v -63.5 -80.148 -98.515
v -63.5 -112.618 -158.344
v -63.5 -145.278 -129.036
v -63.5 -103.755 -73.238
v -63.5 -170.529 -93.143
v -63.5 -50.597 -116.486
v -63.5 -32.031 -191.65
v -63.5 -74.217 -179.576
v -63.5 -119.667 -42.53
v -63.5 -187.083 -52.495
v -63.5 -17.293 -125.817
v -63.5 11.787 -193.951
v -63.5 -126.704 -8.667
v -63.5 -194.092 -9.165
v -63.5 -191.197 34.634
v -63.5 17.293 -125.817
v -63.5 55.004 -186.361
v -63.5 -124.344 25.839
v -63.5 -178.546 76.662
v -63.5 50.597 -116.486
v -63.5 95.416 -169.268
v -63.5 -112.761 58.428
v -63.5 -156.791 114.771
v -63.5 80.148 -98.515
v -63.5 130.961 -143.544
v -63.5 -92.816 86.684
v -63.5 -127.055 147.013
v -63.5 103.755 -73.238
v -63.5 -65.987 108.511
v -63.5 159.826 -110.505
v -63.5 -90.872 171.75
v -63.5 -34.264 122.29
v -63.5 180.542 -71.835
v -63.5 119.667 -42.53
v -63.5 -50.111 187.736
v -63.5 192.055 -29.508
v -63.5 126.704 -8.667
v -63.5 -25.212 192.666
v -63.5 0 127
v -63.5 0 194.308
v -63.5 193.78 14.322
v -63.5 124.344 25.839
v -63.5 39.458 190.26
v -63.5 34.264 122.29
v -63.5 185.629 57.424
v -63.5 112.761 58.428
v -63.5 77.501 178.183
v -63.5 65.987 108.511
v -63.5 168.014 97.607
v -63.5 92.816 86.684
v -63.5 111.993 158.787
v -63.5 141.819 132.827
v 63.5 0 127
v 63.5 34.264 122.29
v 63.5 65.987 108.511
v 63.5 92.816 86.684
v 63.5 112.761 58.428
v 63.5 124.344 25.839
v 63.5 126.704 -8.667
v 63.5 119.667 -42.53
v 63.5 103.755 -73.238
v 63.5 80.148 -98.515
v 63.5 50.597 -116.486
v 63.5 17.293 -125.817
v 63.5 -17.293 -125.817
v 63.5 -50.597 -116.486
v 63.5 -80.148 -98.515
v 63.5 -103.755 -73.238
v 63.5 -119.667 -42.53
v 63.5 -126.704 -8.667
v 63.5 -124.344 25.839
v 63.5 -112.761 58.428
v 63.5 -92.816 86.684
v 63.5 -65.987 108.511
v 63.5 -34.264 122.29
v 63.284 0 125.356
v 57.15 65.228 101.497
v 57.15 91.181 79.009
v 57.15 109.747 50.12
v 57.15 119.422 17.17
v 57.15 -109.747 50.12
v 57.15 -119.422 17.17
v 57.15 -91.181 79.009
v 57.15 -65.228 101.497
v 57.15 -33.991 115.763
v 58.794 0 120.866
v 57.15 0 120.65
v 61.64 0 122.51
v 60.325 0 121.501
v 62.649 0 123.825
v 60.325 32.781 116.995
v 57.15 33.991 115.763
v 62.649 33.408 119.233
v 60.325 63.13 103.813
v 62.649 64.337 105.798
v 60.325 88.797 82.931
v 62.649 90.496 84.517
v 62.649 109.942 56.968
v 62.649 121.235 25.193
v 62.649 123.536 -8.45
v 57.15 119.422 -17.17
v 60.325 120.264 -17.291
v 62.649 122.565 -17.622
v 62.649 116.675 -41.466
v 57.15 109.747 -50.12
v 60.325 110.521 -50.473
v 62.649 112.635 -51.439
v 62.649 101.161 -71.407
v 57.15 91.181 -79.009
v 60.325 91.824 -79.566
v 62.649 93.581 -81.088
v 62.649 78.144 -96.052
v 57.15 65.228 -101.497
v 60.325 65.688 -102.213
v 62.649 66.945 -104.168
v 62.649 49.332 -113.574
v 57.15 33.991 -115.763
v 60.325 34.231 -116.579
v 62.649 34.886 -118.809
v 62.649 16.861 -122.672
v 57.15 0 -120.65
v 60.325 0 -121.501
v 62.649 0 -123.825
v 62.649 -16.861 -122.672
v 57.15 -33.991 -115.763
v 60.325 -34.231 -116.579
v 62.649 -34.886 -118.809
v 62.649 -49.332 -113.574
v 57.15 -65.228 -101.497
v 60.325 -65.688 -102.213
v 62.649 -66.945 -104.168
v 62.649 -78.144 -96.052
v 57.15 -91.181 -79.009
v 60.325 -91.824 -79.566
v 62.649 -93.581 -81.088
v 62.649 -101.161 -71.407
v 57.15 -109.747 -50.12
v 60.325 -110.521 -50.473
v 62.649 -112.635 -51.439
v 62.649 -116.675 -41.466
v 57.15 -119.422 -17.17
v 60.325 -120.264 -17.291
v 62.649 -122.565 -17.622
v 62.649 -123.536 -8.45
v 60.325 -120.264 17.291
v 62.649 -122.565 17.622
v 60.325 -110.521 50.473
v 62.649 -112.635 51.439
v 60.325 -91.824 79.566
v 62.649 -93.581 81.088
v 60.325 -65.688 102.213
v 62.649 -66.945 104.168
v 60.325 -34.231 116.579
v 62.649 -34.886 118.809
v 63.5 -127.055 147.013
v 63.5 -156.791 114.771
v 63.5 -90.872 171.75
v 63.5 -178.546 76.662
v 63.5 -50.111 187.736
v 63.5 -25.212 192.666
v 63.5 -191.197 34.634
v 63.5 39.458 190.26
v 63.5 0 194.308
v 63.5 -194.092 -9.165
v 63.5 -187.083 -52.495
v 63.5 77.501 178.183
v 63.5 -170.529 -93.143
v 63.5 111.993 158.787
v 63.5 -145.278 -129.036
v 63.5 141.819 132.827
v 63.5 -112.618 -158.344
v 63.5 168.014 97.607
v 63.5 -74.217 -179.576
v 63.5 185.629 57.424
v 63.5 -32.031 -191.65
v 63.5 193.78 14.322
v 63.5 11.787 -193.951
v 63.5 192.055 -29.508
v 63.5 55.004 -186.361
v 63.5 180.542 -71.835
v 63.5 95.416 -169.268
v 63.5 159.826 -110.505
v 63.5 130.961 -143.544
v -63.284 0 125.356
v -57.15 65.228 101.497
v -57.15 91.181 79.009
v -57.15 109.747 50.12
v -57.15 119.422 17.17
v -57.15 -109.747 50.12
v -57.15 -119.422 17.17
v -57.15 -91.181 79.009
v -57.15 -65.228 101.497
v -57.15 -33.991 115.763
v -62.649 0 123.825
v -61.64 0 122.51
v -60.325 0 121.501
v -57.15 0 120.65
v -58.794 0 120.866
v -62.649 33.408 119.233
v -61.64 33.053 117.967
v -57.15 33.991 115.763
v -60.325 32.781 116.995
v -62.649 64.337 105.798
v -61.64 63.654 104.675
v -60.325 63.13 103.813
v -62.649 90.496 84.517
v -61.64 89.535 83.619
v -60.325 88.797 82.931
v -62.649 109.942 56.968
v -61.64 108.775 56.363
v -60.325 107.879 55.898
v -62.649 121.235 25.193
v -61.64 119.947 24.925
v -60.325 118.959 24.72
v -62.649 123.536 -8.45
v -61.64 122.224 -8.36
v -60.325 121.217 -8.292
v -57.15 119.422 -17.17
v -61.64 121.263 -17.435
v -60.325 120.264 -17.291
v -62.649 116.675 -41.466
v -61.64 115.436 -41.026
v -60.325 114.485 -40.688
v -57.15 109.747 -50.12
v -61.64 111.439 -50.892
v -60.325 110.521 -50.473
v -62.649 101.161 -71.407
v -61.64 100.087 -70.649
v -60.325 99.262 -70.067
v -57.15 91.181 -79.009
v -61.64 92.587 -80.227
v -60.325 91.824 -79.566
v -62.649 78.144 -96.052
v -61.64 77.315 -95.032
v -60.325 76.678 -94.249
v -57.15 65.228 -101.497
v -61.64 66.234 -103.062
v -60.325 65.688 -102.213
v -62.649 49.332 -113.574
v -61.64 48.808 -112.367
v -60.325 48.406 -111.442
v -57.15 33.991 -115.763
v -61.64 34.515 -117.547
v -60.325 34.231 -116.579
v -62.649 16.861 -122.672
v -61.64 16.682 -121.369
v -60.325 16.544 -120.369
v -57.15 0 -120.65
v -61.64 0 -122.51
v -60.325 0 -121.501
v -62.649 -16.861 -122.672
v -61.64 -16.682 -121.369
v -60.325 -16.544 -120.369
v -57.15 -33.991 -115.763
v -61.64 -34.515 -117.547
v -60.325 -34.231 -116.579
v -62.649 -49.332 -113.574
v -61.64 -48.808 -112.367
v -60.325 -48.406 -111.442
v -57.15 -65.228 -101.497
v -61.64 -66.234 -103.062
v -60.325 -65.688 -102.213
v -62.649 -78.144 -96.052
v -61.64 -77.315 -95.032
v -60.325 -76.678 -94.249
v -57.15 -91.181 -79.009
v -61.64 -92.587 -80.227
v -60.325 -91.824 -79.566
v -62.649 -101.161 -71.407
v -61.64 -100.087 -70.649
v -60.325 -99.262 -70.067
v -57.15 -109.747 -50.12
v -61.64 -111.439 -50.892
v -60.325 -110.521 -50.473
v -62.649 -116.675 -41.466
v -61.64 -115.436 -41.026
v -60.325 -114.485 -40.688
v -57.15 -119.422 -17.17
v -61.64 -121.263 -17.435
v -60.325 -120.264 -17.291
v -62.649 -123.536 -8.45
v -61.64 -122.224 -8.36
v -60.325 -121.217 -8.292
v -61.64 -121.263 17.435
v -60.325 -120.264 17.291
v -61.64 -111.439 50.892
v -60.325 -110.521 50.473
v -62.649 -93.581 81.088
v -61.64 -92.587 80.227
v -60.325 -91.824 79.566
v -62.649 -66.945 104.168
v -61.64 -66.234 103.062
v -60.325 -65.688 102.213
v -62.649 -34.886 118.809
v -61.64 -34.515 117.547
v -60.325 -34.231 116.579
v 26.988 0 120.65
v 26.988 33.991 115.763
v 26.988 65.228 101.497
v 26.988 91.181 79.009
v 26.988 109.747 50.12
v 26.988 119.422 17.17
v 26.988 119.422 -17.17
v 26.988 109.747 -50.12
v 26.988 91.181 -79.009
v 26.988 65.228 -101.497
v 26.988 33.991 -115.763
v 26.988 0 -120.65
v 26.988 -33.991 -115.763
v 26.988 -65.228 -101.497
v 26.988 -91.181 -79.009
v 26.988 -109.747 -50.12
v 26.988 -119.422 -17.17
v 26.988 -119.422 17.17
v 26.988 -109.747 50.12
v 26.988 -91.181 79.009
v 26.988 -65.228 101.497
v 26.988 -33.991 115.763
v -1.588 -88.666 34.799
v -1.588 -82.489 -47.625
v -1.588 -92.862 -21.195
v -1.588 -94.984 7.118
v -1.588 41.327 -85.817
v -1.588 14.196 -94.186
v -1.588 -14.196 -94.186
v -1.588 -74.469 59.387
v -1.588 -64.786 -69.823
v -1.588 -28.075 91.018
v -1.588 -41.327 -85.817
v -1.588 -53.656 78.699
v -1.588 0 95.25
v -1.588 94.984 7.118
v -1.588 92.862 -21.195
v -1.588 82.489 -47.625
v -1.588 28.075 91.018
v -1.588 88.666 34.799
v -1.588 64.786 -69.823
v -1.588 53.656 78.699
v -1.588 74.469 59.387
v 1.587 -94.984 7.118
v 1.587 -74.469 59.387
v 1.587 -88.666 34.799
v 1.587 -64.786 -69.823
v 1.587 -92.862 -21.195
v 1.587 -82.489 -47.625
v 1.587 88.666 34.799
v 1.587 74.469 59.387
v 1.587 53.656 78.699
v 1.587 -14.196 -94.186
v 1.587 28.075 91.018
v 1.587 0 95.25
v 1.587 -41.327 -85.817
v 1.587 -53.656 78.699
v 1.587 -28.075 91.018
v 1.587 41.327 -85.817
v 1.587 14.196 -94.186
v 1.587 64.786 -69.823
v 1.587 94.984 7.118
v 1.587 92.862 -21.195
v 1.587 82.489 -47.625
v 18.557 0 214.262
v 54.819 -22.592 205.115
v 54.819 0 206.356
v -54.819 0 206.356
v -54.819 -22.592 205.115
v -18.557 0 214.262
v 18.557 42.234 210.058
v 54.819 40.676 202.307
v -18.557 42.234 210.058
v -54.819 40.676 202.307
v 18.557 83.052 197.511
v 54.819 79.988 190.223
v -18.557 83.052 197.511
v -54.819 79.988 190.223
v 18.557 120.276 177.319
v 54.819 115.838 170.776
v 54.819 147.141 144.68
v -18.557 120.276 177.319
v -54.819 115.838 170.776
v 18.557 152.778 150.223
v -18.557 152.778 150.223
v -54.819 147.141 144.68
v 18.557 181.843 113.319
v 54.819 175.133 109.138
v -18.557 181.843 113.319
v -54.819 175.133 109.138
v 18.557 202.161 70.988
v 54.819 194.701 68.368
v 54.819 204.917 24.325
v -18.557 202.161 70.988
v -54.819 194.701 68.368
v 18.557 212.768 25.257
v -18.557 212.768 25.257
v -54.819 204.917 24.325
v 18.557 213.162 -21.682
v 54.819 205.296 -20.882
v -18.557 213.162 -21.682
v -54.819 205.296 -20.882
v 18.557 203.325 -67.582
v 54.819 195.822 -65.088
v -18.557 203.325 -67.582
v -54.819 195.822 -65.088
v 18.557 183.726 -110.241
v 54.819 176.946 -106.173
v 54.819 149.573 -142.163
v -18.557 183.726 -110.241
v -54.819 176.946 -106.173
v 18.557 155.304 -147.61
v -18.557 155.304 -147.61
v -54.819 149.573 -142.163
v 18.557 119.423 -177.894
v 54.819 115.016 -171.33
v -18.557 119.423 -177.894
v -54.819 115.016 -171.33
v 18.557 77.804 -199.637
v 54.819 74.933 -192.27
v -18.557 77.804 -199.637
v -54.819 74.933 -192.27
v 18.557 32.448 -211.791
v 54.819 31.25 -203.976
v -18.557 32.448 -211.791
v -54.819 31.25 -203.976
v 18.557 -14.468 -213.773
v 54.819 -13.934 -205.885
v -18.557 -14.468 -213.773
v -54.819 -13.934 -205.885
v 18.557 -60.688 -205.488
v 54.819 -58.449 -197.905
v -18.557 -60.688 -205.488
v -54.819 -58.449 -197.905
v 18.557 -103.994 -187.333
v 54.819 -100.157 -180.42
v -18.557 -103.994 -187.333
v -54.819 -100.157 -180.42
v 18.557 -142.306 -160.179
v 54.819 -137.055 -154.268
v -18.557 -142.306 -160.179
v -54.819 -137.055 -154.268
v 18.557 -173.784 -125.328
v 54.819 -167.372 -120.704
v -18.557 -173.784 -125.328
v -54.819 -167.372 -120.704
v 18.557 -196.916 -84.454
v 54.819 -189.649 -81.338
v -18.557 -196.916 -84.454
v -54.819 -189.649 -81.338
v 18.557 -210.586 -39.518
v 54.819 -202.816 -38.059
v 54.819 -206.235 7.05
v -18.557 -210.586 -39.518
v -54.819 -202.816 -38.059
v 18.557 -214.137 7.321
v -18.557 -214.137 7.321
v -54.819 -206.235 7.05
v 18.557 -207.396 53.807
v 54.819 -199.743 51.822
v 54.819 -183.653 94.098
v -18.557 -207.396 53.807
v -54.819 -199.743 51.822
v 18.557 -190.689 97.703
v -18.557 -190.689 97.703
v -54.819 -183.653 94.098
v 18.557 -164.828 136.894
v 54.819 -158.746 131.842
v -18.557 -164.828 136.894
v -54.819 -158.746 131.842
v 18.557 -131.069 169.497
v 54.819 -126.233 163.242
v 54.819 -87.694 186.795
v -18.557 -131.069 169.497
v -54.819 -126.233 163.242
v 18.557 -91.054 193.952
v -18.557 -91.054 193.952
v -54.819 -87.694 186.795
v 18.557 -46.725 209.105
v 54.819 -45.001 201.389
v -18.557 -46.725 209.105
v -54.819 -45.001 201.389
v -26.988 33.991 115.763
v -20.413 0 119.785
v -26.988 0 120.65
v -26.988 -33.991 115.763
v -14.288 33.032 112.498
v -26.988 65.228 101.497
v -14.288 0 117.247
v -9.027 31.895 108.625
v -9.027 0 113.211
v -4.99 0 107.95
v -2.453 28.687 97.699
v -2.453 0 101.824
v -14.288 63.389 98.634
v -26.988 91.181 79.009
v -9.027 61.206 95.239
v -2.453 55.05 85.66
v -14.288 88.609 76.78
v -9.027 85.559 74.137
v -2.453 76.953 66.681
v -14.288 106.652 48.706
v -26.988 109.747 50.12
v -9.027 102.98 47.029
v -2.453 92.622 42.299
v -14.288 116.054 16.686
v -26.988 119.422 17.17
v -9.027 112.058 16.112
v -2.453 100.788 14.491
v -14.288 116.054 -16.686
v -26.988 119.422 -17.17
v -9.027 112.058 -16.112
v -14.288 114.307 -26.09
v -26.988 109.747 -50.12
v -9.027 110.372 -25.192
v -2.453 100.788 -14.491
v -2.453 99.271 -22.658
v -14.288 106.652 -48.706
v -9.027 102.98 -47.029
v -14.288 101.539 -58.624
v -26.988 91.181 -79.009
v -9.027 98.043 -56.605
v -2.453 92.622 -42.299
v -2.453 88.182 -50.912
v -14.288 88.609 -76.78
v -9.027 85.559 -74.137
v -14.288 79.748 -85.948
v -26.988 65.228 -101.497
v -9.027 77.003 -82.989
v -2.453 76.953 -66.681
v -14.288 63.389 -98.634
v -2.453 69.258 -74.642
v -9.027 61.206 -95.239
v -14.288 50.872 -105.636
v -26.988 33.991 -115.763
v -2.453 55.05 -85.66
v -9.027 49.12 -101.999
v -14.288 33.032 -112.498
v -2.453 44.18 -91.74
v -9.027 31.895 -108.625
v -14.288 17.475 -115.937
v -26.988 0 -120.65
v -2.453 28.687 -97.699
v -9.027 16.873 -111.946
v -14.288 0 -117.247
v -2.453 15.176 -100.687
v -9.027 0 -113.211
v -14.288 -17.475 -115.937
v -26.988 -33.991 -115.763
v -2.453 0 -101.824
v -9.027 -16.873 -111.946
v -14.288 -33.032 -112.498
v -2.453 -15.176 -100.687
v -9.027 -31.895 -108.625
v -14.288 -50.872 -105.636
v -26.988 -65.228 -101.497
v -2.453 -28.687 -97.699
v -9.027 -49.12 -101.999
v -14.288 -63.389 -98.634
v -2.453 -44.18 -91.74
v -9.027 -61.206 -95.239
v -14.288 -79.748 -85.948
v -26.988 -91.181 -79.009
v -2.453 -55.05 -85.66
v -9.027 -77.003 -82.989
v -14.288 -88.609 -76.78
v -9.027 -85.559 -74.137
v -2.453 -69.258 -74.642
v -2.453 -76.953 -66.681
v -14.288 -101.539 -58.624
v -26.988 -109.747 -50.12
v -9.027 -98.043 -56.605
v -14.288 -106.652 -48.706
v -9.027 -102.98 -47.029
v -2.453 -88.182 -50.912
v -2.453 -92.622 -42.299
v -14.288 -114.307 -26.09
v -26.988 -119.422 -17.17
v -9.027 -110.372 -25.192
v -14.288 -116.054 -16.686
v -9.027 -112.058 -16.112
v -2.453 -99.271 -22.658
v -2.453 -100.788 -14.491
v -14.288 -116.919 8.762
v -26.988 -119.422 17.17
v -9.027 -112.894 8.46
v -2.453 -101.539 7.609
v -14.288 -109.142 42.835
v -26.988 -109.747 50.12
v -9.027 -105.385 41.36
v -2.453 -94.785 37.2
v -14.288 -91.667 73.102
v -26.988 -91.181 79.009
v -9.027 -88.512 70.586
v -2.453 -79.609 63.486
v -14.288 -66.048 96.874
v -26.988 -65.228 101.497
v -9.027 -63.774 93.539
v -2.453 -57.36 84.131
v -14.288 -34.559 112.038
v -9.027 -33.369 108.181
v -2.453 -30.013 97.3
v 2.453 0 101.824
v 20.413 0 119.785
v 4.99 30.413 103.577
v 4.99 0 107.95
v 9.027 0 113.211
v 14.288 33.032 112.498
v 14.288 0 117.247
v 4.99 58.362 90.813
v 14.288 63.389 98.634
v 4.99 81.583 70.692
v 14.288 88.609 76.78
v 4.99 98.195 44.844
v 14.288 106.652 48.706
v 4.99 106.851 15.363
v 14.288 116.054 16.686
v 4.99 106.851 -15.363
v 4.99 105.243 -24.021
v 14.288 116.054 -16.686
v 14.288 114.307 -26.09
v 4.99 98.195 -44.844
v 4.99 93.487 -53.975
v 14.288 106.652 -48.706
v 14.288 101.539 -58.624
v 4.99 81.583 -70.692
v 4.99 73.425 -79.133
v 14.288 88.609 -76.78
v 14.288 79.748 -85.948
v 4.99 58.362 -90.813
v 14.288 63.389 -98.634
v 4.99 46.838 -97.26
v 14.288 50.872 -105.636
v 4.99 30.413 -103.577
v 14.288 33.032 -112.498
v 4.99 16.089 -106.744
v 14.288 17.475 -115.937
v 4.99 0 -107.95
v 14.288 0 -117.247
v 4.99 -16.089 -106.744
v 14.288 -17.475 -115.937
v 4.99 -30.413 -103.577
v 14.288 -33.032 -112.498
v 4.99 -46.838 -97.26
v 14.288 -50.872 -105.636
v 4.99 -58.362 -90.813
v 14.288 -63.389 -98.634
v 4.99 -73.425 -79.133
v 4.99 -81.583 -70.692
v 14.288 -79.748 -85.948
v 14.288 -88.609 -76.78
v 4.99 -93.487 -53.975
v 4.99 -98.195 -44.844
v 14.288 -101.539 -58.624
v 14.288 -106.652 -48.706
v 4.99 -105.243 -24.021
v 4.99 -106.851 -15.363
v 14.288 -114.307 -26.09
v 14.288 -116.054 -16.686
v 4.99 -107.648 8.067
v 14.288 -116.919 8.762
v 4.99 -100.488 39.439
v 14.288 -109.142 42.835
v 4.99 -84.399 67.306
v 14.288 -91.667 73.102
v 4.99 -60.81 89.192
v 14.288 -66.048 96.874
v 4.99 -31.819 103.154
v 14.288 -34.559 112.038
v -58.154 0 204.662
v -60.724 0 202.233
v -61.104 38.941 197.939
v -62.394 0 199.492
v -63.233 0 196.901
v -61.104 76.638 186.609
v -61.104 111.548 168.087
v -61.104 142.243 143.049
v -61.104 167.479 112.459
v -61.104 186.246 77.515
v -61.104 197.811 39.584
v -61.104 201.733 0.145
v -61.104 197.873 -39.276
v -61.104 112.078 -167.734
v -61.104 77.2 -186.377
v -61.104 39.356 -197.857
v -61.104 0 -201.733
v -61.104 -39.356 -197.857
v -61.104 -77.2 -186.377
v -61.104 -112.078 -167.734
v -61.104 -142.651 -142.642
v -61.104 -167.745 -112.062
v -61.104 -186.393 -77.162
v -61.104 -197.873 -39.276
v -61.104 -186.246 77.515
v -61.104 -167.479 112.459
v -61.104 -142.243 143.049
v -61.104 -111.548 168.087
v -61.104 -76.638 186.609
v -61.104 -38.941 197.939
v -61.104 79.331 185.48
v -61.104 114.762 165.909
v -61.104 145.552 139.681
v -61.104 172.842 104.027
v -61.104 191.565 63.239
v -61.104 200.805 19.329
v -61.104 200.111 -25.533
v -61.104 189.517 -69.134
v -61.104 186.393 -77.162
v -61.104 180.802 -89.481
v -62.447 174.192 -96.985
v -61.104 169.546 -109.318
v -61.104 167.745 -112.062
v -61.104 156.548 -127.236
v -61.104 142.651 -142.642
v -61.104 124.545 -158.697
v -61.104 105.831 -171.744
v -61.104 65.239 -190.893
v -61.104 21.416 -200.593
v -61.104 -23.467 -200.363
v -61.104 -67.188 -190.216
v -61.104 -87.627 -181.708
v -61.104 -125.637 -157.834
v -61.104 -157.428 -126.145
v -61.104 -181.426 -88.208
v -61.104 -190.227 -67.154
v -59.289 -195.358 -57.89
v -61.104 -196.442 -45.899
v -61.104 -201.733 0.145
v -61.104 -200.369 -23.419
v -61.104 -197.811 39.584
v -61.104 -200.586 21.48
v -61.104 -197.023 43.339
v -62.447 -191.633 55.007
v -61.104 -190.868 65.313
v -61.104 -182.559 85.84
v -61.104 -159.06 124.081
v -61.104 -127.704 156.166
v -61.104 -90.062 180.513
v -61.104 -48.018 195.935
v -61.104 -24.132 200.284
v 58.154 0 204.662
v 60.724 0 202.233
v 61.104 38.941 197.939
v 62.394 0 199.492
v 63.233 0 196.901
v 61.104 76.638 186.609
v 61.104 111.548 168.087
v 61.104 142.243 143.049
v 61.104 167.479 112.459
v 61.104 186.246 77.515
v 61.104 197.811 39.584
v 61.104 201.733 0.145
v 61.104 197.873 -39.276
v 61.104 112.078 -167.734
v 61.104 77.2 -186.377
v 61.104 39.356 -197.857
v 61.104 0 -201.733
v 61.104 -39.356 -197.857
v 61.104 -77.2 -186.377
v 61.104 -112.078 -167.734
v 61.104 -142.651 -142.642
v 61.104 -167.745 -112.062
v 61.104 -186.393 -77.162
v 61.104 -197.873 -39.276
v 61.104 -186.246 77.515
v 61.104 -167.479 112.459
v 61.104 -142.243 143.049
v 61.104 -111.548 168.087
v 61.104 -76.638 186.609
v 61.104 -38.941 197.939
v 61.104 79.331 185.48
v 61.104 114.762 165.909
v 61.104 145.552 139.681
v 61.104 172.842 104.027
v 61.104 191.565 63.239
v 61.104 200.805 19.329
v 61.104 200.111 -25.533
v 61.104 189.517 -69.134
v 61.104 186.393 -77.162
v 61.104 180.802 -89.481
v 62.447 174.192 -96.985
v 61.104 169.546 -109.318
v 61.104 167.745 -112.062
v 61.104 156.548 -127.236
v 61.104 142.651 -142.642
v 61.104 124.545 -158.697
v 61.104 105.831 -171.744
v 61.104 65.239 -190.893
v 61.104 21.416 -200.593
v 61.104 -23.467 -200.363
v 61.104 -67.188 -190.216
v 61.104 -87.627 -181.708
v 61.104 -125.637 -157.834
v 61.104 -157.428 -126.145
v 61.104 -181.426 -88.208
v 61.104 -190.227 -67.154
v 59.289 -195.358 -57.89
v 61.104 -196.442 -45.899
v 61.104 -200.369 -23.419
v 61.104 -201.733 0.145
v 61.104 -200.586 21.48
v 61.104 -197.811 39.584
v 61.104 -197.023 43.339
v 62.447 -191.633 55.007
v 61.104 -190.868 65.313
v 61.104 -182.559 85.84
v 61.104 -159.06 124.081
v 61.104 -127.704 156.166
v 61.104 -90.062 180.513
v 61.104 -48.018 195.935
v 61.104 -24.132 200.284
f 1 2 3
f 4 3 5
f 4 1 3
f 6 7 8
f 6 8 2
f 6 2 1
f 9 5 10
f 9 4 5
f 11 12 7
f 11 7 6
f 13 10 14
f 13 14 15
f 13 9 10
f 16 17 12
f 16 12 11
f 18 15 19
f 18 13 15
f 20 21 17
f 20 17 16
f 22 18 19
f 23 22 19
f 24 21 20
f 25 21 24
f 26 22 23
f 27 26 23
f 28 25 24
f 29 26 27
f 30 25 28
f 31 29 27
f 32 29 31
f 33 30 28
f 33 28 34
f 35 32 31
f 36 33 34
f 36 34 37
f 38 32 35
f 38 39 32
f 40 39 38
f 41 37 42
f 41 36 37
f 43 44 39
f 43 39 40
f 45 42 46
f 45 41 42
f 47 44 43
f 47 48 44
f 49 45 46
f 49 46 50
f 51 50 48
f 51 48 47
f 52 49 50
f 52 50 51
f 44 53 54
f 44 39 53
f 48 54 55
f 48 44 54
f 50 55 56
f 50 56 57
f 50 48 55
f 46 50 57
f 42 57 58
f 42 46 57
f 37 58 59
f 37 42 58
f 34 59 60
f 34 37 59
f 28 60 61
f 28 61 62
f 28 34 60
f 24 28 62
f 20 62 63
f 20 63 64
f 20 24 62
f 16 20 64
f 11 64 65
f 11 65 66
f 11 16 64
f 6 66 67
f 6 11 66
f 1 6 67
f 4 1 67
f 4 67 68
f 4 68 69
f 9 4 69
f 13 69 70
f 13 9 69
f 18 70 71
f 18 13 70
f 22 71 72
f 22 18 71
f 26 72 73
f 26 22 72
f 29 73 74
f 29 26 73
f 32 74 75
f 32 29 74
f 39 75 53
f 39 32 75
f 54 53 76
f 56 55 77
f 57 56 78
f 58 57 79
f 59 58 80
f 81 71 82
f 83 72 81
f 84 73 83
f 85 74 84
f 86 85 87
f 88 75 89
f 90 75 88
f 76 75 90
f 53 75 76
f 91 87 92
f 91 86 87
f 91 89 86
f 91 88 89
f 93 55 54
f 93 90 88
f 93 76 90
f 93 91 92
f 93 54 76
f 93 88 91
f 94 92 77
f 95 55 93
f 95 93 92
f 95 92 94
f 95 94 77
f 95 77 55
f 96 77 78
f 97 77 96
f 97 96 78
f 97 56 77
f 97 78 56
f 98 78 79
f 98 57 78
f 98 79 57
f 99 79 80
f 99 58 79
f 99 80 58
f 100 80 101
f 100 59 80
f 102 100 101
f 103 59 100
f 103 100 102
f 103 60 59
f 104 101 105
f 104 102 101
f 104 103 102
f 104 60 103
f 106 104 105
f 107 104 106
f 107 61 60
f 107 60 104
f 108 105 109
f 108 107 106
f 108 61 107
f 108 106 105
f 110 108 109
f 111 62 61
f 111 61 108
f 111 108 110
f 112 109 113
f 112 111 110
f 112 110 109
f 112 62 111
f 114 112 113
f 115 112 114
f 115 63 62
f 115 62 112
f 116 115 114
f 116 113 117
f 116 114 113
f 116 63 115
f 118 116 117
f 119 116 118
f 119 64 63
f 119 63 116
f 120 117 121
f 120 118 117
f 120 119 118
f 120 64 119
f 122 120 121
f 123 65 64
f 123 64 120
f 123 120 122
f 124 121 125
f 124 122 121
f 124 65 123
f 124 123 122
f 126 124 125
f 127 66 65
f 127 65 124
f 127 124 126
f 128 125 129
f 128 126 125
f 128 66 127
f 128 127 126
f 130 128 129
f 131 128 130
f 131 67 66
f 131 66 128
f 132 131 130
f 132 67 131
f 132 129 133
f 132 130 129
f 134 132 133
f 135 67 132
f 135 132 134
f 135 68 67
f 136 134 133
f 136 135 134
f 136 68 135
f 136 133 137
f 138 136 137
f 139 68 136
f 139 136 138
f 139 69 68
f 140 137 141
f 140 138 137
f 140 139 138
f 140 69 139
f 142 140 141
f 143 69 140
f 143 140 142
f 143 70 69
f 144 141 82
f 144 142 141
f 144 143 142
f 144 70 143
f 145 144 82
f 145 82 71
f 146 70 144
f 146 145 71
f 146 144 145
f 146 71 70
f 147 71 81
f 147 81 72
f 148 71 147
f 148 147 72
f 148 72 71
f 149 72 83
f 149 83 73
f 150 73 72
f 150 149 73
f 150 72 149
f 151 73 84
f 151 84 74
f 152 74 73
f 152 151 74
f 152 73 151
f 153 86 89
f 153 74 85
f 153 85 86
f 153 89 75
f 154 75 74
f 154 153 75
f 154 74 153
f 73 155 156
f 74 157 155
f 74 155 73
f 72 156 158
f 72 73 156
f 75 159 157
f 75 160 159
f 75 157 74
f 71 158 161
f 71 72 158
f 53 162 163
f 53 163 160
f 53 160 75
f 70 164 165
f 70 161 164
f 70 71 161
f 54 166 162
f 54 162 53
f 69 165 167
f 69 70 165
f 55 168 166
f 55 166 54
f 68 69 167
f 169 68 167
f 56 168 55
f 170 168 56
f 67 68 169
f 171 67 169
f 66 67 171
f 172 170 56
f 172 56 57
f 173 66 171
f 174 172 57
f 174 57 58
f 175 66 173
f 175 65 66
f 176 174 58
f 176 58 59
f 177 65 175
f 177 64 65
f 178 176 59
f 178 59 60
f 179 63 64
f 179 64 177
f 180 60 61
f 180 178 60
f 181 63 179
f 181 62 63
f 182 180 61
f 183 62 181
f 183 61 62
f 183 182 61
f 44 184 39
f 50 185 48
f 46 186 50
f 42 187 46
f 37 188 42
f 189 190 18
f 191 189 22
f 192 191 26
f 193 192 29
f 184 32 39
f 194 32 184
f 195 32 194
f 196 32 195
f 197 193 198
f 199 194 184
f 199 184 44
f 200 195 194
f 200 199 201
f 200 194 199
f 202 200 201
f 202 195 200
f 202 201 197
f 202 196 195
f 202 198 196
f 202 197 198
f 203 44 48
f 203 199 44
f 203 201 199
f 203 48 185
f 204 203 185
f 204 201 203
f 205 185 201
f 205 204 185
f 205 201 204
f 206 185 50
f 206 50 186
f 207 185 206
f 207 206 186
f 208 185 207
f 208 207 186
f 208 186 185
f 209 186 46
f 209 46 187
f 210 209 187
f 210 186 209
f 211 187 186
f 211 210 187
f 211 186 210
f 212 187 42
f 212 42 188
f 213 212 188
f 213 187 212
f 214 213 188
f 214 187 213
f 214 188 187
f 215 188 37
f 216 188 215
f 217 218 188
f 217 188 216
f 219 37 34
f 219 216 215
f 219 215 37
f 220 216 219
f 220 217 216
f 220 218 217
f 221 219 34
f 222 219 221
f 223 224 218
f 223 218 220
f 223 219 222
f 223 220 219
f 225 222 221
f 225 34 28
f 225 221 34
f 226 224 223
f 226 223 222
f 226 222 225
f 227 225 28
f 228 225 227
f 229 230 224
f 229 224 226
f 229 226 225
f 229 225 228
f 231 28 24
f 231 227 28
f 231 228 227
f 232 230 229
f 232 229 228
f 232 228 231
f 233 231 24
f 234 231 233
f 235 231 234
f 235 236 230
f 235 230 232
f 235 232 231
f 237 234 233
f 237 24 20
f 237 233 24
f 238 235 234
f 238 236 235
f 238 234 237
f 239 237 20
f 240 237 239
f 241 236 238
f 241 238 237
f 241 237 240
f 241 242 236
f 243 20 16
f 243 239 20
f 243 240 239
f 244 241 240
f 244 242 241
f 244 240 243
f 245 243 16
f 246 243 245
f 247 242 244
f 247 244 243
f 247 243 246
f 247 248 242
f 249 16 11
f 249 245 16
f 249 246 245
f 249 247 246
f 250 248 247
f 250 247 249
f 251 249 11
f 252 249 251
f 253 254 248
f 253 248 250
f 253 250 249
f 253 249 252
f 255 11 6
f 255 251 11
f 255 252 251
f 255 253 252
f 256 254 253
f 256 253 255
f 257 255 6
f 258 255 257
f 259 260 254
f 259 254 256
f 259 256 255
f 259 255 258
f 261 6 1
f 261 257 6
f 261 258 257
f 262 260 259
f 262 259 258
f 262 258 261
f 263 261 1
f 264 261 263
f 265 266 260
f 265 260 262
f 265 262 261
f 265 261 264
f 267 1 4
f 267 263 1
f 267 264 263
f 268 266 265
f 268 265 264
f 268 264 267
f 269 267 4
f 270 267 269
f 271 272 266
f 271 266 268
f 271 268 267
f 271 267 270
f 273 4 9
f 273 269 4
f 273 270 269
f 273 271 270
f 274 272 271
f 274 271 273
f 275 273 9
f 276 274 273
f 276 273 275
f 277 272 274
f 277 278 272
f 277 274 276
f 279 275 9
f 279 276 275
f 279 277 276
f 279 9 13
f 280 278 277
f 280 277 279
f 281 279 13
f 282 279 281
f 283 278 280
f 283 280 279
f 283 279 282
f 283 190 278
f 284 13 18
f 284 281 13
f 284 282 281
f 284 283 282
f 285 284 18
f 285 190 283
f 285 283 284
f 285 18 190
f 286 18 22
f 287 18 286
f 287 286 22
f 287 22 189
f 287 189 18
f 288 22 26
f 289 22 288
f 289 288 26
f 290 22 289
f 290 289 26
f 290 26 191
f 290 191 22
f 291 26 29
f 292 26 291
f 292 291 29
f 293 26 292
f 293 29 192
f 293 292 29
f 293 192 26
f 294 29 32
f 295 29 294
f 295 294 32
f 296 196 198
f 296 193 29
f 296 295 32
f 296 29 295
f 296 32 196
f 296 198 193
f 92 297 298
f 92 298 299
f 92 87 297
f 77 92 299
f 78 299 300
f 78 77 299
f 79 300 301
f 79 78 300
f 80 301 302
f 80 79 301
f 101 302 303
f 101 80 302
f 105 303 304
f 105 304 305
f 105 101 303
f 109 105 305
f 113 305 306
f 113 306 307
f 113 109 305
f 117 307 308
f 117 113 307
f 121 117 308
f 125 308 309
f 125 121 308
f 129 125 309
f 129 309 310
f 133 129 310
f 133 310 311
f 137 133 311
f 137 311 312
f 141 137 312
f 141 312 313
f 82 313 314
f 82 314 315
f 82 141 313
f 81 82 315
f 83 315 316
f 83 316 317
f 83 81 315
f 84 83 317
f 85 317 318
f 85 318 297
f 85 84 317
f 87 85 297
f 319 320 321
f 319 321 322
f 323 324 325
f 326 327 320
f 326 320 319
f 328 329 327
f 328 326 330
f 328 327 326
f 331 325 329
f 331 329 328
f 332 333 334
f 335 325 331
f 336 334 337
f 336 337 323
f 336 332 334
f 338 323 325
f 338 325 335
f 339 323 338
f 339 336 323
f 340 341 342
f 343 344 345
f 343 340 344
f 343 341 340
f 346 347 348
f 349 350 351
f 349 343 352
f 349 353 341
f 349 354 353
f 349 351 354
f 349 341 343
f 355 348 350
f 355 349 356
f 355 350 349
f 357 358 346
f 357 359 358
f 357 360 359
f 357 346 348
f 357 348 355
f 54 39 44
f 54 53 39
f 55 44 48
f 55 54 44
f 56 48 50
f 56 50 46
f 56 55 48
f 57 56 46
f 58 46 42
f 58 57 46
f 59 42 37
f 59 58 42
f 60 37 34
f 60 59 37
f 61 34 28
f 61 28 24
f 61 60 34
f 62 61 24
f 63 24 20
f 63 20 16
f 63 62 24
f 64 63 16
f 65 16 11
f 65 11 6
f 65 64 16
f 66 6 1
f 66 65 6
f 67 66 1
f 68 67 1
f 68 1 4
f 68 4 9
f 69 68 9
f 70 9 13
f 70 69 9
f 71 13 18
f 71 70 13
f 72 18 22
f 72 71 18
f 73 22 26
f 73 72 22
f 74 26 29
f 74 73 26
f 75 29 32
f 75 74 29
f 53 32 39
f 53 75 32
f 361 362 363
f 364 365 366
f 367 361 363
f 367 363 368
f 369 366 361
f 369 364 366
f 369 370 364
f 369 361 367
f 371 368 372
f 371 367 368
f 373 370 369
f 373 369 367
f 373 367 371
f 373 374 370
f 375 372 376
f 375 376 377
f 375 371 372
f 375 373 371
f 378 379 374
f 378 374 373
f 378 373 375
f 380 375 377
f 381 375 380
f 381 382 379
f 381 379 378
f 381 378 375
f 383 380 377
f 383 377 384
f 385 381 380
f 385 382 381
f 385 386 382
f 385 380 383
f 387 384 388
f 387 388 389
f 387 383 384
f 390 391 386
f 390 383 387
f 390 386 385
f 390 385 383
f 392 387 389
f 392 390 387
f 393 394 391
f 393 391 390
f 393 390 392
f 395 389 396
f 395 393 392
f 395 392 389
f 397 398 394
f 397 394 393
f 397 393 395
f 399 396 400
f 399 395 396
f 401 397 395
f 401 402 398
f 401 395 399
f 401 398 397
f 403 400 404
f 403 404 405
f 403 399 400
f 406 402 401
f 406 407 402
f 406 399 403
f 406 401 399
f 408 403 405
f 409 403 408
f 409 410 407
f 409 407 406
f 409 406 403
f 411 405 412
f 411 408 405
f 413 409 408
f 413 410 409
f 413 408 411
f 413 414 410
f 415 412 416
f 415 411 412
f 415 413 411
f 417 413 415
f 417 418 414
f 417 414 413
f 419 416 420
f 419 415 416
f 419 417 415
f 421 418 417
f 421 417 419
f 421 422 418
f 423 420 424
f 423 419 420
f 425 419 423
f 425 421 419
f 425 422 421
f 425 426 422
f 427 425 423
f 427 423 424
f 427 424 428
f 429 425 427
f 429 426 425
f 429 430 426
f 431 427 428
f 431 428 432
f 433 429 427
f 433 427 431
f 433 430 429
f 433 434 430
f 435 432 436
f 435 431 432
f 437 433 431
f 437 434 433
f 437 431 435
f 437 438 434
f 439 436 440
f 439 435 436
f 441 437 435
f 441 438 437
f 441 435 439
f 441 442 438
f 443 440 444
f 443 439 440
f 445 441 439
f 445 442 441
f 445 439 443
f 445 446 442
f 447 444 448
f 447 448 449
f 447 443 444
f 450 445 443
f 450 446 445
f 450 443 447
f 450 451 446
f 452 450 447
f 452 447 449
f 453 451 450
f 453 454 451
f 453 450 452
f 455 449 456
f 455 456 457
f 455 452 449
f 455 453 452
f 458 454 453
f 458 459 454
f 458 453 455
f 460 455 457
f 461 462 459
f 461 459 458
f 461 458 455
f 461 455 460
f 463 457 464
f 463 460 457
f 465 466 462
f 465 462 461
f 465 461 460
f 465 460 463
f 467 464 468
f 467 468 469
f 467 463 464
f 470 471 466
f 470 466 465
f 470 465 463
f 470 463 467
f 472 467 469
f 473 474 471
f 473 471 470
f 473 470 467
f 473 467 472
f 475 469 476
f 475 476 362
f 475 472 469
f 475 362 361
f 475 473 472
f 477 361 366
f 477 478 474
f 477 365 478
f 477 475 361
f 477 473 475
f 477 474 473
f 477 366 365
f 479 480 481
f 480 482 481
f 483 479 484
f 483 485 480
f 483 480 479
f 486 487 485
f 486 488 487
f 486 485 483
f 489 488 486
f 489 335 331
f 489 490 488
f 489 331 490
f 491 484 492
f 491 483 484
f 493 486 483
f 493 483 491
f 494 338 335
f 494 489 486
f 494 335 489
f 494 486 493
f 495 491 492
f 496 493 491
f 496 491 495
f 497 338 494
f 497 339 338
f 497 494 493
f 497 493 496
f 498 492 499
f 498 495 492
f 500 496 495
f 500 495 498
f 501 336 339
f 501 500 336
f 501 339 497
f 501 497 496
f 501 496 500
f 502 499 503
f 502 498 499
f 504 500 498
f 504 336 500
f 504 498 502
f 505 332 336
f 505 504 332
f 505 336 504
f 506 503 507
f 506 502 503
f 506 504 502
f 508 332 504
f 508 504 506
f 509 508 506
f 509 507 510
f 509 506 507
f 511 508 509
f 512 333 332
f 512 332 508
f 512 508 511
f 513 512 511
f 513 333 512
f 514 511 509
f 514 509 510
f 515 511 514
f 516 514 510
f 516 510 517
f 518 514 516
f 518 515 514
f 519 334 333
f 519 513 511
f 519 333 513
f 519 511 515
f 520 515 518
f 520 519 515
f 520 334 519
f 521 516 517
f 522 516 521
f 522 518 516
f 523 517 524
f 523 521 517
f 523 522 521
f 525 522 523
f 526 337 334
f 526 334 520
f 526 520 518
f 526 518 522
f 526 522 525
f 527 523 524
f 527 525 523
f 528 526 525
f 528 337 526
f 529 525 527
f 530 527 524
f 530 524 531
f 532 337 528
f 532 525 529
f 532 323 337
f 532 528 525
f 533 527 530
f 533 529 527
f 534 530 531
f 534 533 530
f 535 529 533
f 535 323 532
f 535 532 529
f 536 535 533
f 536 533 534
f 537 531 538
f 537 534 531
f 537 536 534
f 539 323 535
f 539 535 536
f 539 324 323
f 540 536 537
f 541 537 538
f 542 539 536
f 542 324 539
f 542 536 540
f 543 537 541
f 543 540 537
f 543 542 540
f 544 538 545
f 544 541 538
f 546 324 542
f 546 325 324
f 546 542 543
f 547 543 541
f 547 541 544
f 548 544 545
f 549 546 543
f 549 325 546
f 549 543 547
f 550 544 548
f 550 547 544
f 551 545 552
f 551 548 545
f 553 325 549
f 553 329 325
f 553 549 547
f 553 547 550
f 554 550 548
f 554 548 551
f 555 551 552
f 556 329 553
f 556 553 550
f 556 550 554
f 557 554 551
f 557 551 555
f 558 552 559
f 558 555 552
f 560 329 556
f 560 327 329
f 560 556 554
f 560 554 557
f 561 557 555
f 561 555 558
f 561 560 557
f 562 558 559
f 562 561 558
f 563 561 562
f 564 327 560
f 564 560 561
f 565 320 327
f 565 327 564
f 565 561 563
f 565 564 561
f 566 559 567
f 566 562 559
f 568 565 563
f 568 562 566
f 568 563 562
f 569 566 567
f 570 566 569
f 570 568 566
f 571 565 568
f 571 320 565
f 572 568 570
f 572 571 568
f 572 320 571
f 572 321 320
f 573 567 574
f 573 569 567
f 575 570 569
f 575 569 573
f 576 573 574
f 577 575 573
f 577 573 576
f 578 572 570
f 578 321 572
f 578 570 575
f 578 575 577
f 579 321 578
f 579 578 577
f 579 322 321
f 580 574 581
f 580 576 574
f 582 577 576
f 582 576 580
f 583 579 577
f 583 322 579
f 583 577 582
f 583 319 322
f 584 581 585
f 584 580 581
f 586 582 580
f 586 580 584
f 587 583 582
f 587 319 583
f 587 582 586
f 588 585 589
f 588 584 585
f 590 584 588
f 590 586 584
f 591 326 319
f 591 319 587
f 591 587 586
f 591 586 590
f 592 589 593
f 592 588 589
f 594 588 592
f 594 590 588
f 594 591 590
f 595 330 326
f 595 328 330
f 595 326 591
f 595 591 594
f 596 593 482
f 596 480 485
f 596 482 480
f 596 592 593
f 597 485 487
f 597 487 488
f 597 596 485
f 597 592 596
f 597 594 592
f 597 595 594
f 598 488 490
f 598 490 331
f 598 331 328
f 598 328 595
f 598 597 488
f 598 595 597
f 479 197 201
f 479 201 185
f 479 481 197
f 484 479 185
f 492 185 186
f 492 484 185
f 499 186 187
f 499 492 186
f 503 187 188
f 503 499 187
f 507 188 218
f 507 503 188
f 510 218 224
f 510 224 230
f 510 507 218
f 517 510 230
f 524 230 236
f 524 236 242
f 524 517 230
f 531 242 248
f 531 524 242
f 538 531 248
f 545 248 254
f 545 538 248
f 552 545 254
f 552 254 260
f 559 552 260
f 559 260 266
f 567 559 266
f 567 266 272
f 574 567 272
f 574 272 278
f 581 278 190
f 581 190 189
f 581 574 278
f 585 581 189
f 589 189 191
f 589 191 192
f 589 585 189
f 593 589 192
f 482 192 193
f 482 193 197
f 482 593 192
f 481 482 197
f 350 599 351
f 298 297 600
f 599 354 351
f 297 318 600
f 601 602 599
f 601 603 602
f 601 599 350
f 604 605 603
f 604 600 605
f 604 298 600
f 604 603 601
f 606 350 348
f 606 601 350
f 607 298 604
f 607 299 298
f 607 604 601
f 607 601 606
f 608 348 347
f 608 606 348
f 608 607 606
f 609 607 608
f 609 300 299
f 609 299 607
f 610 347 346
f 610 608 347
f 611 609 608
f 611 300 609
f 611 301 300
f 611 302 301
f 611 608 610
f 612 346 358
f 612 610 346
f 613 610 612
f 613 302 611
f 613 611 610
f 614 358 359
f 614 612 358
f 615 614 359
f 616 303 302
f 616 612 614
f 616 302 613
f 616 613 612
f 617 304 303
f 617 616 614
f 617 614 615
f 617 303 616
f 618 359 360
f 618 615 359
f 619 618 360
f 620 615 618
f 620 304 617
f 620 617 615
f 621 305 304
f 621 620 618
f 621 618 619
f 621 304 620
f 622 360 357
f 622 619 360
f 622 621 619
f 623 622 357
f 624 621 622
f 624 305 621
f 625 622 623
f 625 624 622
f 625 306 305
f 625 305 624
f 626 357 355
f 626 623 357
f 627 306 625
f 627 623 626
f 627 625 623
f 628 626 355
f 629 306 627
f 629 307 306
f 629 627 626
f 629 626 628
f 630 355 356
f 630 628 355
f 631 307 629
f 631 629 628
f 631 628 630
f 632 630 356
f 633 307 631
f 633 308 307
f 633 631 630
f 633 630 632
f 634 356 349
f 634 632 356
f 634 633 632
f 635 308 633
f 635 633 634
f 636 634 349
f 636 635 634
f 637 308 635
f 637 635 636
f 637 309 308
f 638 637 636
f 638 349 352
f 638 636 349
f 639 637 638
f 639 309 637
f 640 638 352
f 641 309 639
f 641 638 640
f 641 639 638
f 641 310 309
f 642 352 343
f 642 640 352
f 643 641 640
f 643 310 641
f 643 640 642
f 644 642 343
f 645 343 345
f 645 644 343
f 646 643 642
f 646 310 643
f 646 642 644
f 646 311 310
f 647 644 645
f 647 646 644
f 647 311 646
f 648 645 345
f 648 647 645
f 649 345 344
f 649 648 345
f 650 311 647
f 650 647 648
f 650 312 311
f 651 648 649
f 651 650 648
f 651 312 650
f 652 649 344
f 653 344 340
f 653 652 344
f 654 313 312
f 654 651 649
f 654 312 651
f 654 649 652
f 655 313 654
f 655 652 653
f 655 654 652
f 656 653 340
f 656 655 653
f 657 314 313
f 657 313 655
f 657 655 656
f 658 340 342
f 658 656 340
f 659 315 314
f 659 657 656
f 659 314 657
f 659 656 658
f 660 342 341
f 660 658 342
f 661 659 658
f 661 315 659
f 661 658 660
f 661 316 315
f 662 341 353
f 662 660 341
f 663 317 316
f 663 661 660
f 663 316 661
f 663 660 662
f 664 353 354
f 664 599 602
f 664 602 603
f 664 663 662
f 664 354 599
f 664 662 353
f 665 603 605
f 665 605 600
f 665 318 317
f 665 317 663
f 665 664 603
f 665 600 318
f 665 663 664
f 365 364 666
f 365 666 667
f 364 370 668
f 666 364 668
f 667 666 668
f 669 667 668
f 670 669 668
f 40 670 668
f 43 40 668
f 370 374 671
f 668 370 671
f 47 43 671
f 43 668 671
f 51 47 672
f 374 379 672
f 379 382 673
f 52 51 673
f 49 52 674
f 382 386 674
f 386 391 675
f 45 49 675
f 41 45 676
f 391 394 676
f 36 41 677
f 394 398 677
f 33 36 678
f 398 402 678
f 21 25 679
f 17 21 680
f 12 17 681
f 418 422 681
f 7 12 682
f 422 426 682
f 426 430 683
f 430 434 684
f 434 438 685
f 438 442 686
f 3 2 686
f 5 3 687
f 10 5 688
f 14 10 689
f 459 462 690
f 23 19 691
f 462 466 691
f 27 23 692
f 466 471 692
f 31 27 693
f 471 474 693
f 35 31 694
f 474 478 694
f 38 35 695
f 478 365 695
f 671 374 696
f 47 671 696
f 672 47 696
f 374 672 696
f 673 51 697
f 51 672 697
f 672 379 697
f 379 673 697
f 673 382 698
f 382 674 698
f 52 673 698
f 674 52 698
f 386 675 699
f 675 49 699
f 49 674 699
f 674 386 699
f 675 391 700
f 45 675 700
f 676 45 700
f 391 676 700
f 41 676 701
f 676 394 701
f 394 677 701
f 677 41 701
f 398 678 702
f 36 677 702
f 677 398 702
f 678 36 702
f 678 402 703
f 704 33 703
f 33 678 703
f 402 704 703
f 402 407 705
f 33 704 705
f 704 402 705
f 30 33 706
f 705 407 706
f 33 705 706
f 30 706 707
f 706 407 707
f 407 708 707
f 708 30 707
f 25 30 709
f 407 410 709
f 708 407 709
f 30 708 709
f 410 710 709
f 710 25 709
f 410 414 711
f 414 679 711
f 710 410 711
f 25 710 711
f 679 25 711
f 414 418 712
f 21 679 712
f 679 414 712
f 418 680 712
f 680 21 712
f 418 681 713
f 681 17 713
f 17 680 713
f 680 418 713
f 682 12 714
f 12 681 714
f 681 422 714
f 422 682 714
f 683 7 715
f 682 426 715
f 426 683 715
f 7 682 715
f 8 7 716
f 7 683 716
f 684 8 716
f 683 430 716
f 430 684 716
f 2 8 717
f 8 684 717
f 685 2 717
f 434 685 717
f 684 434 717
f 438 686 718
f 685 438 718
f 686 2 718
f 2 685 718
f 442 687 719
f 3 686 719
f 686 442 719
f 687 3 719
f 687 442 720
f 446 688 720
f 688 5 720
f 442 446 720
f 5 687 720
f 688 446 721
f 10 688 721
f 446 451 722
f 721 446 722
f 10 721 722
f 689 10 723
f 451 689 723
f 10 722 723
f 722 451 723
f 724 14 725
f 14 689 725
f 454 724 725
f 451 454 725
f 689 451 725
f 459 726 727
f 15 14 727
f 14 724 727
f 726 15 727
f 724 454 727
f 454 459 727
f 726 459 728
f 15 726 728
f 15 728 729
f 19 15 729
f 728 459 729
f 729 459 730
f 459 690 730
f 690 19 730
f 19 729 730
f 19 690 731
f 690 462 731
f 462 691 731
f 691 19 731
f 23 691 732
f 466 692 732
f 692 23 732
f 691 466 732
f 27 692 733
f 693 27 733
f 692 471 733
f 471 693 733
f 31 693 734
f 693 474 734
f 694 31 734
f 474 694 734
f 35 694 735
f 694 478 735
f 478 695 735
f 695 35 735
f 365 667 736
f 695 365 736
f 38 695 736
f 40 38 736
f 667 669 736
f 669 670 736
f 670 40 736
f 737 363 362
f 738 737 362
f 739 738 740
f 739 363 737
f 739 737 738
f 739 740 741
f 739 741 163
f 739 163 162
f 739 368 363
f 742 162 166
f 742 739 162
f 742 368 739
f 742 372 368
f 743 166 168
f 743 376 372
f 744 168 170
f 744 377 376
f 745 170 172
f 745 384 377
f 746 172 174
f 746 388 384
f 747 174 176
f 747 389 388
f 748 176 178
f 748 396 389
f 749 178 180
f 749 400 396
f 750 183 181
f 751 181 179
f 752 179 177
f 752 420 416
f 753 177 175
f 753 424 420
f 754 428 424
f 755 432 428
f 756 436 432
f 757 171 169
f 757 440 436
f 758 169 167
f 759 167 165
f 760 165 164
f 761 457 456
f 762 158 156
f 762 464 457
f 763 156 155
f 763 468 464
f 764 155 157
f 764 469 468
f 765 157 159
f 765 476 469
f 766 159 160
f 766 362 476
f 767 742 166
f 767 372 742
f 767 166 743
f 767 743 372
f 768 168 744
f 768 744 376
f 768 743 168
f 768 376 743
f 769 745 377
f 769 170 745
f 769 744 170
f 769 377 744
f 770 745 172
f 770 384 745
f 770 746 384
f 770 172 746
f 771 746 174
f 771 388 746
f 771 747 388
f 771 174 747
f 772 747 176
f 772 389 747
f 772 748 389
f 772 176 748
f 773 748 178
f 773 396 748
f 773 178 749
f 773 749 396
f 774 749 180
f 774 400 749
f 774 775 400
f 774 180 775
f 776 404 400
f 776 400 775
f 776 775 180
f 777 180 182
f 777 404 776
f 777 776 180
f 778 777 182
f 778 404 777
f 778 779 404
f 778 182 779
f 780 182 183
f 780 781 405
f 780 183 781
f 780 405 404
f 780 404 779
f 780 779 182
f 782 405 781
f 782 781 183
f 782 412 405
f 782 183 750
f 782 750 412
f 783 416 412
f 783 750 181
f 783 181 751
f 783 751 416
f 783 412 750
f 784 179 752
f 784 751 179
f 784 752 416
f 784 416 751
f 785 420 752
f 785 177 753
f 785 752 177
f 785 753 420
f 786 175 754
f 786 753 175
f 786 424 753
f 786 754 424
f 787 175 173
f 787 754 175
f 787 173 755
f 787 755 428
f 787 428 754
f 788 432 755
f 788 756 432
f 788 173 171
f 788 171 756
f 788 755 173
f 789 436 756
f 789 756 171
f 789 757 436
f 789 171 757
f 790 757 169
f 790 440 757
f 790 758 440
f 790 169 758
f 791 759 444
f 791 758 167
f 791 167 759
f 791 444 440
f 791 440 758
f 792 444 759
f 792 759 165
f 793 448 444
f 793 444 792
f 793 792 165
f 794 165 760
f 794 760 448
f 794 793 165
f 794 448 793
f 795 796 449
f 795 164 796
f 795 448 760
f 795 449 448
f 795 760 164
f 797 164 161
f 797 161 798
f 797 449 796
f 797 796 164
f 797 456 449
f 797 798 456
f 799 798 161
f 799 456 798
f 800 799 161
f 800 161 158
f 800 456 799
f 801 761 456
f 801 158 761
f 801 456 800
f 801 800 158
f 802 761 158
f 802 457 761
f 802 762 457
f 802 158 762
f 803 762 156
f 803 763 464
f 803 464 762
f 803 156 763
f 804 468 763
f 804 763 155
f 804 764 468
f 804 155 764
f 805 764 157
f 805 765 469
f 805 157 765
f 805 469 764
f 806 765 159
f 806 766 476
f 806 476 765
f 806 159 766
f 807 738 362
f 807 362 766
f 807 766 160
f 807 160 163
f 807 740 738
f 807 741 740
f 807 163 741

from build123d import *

# Parameters (mm, degrees)
F3_R = 12.7


with BuildPart() as f2:
    # F1 (on Front) → F2 (revolve)
    with BuildSketch(Plane.XZ):
        with BuildLine():
            ThreePointArc((63.5, 203.2), (0, 215.258916), (-63.5, 203.2))
            Line((-63.5, 203.2), (-63.5, 127))
            Line((-63.5, 127), (63.5, 127))
            Line((63.5, 127), (63.5, 203.2))
        make_face()
    revolve(axis=Axis((-24.373954, 0, 0), (-1, 0, 0)))

    # F3
    f3_edges = [f2.edges().sort_by_distance(p)[0] for p in [
        (63.5, 0, -203.2),
        (-63.5, 0, -203.2),
    ]]
    fillet(f3_edges, radius=F3_R)


with BuildPart() as f5:
    # F4 (on Front) → F5 (revolve)
    with BuildSketch(Plane.XZ):
        with BuildLine():
            ThreePointArc((-63.5, 127), (-61.640128, 122.509872), (-57.15, 120.65))
            Line((-57.15, 120.65), (-26.9875, 120.65))
            ThreePointArc((-26.9875, 120.65), (-9.026988, 113.210512), (-1.5875, 95.25))
            Line((-1.5875, 95.25), (-1.5875, 0))
            Line((-1.5875, 0), (1.5875, 0))
            Line((1.5875, 0), (1.5875, 95.25))
            ThreePointArc((1.5875, 95.25), (9.026988, 113.210512), (26.9875, 120.65))
            Line((26.9875, 120.65), (57.15, 120.65))
            ThreePointArc((57.15, 120.65), (61.640128, 122.509872), (63.5, 127))
            Line((63.5, 127), (-63.5, 127))
        make_face()
    revolve(axis=Axis((-24.373954, 0, 0), (-1, 0, 0)))


solid = Compound([f2.part, f5.part])
